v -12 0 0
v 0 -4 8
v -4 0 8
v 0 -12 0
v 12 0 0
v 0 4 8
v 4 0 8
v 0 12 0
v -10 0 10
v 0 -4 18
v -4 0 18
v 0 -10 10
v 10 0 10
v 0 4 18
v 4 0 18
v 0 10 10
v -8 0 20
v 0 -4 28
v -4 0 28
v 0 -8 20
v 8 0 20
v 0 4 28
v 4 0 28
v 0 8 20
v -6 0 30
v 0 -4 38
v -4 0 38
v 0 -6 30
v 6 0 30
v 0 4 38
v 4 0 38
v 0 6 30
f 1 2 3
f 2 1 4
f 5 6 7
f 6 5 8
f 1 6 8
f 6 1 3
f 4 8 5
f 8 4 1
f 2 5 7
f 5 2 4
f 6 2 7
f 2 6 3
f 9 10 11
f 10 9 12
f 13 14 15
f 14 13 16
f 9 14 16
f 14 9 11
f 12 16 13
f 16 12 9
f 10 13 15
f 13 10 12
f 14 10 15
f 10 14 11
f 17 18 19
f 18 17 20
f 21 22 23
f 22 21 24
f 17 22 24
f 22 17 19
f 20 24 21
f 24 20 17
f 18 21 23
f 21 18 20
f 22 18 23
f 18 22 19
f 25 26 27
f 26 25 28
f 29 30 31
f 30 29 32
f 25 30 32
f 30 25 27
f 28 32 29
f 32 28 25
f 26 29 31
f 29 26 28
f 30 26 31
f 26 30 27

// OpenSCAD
// Example: Stacked Pyramids
$fn=4;
for (h=[0:3]) {
    translate([0, 0, h*10])
        cylinder(h=8, r1=12-h*2, r2=4);
}
